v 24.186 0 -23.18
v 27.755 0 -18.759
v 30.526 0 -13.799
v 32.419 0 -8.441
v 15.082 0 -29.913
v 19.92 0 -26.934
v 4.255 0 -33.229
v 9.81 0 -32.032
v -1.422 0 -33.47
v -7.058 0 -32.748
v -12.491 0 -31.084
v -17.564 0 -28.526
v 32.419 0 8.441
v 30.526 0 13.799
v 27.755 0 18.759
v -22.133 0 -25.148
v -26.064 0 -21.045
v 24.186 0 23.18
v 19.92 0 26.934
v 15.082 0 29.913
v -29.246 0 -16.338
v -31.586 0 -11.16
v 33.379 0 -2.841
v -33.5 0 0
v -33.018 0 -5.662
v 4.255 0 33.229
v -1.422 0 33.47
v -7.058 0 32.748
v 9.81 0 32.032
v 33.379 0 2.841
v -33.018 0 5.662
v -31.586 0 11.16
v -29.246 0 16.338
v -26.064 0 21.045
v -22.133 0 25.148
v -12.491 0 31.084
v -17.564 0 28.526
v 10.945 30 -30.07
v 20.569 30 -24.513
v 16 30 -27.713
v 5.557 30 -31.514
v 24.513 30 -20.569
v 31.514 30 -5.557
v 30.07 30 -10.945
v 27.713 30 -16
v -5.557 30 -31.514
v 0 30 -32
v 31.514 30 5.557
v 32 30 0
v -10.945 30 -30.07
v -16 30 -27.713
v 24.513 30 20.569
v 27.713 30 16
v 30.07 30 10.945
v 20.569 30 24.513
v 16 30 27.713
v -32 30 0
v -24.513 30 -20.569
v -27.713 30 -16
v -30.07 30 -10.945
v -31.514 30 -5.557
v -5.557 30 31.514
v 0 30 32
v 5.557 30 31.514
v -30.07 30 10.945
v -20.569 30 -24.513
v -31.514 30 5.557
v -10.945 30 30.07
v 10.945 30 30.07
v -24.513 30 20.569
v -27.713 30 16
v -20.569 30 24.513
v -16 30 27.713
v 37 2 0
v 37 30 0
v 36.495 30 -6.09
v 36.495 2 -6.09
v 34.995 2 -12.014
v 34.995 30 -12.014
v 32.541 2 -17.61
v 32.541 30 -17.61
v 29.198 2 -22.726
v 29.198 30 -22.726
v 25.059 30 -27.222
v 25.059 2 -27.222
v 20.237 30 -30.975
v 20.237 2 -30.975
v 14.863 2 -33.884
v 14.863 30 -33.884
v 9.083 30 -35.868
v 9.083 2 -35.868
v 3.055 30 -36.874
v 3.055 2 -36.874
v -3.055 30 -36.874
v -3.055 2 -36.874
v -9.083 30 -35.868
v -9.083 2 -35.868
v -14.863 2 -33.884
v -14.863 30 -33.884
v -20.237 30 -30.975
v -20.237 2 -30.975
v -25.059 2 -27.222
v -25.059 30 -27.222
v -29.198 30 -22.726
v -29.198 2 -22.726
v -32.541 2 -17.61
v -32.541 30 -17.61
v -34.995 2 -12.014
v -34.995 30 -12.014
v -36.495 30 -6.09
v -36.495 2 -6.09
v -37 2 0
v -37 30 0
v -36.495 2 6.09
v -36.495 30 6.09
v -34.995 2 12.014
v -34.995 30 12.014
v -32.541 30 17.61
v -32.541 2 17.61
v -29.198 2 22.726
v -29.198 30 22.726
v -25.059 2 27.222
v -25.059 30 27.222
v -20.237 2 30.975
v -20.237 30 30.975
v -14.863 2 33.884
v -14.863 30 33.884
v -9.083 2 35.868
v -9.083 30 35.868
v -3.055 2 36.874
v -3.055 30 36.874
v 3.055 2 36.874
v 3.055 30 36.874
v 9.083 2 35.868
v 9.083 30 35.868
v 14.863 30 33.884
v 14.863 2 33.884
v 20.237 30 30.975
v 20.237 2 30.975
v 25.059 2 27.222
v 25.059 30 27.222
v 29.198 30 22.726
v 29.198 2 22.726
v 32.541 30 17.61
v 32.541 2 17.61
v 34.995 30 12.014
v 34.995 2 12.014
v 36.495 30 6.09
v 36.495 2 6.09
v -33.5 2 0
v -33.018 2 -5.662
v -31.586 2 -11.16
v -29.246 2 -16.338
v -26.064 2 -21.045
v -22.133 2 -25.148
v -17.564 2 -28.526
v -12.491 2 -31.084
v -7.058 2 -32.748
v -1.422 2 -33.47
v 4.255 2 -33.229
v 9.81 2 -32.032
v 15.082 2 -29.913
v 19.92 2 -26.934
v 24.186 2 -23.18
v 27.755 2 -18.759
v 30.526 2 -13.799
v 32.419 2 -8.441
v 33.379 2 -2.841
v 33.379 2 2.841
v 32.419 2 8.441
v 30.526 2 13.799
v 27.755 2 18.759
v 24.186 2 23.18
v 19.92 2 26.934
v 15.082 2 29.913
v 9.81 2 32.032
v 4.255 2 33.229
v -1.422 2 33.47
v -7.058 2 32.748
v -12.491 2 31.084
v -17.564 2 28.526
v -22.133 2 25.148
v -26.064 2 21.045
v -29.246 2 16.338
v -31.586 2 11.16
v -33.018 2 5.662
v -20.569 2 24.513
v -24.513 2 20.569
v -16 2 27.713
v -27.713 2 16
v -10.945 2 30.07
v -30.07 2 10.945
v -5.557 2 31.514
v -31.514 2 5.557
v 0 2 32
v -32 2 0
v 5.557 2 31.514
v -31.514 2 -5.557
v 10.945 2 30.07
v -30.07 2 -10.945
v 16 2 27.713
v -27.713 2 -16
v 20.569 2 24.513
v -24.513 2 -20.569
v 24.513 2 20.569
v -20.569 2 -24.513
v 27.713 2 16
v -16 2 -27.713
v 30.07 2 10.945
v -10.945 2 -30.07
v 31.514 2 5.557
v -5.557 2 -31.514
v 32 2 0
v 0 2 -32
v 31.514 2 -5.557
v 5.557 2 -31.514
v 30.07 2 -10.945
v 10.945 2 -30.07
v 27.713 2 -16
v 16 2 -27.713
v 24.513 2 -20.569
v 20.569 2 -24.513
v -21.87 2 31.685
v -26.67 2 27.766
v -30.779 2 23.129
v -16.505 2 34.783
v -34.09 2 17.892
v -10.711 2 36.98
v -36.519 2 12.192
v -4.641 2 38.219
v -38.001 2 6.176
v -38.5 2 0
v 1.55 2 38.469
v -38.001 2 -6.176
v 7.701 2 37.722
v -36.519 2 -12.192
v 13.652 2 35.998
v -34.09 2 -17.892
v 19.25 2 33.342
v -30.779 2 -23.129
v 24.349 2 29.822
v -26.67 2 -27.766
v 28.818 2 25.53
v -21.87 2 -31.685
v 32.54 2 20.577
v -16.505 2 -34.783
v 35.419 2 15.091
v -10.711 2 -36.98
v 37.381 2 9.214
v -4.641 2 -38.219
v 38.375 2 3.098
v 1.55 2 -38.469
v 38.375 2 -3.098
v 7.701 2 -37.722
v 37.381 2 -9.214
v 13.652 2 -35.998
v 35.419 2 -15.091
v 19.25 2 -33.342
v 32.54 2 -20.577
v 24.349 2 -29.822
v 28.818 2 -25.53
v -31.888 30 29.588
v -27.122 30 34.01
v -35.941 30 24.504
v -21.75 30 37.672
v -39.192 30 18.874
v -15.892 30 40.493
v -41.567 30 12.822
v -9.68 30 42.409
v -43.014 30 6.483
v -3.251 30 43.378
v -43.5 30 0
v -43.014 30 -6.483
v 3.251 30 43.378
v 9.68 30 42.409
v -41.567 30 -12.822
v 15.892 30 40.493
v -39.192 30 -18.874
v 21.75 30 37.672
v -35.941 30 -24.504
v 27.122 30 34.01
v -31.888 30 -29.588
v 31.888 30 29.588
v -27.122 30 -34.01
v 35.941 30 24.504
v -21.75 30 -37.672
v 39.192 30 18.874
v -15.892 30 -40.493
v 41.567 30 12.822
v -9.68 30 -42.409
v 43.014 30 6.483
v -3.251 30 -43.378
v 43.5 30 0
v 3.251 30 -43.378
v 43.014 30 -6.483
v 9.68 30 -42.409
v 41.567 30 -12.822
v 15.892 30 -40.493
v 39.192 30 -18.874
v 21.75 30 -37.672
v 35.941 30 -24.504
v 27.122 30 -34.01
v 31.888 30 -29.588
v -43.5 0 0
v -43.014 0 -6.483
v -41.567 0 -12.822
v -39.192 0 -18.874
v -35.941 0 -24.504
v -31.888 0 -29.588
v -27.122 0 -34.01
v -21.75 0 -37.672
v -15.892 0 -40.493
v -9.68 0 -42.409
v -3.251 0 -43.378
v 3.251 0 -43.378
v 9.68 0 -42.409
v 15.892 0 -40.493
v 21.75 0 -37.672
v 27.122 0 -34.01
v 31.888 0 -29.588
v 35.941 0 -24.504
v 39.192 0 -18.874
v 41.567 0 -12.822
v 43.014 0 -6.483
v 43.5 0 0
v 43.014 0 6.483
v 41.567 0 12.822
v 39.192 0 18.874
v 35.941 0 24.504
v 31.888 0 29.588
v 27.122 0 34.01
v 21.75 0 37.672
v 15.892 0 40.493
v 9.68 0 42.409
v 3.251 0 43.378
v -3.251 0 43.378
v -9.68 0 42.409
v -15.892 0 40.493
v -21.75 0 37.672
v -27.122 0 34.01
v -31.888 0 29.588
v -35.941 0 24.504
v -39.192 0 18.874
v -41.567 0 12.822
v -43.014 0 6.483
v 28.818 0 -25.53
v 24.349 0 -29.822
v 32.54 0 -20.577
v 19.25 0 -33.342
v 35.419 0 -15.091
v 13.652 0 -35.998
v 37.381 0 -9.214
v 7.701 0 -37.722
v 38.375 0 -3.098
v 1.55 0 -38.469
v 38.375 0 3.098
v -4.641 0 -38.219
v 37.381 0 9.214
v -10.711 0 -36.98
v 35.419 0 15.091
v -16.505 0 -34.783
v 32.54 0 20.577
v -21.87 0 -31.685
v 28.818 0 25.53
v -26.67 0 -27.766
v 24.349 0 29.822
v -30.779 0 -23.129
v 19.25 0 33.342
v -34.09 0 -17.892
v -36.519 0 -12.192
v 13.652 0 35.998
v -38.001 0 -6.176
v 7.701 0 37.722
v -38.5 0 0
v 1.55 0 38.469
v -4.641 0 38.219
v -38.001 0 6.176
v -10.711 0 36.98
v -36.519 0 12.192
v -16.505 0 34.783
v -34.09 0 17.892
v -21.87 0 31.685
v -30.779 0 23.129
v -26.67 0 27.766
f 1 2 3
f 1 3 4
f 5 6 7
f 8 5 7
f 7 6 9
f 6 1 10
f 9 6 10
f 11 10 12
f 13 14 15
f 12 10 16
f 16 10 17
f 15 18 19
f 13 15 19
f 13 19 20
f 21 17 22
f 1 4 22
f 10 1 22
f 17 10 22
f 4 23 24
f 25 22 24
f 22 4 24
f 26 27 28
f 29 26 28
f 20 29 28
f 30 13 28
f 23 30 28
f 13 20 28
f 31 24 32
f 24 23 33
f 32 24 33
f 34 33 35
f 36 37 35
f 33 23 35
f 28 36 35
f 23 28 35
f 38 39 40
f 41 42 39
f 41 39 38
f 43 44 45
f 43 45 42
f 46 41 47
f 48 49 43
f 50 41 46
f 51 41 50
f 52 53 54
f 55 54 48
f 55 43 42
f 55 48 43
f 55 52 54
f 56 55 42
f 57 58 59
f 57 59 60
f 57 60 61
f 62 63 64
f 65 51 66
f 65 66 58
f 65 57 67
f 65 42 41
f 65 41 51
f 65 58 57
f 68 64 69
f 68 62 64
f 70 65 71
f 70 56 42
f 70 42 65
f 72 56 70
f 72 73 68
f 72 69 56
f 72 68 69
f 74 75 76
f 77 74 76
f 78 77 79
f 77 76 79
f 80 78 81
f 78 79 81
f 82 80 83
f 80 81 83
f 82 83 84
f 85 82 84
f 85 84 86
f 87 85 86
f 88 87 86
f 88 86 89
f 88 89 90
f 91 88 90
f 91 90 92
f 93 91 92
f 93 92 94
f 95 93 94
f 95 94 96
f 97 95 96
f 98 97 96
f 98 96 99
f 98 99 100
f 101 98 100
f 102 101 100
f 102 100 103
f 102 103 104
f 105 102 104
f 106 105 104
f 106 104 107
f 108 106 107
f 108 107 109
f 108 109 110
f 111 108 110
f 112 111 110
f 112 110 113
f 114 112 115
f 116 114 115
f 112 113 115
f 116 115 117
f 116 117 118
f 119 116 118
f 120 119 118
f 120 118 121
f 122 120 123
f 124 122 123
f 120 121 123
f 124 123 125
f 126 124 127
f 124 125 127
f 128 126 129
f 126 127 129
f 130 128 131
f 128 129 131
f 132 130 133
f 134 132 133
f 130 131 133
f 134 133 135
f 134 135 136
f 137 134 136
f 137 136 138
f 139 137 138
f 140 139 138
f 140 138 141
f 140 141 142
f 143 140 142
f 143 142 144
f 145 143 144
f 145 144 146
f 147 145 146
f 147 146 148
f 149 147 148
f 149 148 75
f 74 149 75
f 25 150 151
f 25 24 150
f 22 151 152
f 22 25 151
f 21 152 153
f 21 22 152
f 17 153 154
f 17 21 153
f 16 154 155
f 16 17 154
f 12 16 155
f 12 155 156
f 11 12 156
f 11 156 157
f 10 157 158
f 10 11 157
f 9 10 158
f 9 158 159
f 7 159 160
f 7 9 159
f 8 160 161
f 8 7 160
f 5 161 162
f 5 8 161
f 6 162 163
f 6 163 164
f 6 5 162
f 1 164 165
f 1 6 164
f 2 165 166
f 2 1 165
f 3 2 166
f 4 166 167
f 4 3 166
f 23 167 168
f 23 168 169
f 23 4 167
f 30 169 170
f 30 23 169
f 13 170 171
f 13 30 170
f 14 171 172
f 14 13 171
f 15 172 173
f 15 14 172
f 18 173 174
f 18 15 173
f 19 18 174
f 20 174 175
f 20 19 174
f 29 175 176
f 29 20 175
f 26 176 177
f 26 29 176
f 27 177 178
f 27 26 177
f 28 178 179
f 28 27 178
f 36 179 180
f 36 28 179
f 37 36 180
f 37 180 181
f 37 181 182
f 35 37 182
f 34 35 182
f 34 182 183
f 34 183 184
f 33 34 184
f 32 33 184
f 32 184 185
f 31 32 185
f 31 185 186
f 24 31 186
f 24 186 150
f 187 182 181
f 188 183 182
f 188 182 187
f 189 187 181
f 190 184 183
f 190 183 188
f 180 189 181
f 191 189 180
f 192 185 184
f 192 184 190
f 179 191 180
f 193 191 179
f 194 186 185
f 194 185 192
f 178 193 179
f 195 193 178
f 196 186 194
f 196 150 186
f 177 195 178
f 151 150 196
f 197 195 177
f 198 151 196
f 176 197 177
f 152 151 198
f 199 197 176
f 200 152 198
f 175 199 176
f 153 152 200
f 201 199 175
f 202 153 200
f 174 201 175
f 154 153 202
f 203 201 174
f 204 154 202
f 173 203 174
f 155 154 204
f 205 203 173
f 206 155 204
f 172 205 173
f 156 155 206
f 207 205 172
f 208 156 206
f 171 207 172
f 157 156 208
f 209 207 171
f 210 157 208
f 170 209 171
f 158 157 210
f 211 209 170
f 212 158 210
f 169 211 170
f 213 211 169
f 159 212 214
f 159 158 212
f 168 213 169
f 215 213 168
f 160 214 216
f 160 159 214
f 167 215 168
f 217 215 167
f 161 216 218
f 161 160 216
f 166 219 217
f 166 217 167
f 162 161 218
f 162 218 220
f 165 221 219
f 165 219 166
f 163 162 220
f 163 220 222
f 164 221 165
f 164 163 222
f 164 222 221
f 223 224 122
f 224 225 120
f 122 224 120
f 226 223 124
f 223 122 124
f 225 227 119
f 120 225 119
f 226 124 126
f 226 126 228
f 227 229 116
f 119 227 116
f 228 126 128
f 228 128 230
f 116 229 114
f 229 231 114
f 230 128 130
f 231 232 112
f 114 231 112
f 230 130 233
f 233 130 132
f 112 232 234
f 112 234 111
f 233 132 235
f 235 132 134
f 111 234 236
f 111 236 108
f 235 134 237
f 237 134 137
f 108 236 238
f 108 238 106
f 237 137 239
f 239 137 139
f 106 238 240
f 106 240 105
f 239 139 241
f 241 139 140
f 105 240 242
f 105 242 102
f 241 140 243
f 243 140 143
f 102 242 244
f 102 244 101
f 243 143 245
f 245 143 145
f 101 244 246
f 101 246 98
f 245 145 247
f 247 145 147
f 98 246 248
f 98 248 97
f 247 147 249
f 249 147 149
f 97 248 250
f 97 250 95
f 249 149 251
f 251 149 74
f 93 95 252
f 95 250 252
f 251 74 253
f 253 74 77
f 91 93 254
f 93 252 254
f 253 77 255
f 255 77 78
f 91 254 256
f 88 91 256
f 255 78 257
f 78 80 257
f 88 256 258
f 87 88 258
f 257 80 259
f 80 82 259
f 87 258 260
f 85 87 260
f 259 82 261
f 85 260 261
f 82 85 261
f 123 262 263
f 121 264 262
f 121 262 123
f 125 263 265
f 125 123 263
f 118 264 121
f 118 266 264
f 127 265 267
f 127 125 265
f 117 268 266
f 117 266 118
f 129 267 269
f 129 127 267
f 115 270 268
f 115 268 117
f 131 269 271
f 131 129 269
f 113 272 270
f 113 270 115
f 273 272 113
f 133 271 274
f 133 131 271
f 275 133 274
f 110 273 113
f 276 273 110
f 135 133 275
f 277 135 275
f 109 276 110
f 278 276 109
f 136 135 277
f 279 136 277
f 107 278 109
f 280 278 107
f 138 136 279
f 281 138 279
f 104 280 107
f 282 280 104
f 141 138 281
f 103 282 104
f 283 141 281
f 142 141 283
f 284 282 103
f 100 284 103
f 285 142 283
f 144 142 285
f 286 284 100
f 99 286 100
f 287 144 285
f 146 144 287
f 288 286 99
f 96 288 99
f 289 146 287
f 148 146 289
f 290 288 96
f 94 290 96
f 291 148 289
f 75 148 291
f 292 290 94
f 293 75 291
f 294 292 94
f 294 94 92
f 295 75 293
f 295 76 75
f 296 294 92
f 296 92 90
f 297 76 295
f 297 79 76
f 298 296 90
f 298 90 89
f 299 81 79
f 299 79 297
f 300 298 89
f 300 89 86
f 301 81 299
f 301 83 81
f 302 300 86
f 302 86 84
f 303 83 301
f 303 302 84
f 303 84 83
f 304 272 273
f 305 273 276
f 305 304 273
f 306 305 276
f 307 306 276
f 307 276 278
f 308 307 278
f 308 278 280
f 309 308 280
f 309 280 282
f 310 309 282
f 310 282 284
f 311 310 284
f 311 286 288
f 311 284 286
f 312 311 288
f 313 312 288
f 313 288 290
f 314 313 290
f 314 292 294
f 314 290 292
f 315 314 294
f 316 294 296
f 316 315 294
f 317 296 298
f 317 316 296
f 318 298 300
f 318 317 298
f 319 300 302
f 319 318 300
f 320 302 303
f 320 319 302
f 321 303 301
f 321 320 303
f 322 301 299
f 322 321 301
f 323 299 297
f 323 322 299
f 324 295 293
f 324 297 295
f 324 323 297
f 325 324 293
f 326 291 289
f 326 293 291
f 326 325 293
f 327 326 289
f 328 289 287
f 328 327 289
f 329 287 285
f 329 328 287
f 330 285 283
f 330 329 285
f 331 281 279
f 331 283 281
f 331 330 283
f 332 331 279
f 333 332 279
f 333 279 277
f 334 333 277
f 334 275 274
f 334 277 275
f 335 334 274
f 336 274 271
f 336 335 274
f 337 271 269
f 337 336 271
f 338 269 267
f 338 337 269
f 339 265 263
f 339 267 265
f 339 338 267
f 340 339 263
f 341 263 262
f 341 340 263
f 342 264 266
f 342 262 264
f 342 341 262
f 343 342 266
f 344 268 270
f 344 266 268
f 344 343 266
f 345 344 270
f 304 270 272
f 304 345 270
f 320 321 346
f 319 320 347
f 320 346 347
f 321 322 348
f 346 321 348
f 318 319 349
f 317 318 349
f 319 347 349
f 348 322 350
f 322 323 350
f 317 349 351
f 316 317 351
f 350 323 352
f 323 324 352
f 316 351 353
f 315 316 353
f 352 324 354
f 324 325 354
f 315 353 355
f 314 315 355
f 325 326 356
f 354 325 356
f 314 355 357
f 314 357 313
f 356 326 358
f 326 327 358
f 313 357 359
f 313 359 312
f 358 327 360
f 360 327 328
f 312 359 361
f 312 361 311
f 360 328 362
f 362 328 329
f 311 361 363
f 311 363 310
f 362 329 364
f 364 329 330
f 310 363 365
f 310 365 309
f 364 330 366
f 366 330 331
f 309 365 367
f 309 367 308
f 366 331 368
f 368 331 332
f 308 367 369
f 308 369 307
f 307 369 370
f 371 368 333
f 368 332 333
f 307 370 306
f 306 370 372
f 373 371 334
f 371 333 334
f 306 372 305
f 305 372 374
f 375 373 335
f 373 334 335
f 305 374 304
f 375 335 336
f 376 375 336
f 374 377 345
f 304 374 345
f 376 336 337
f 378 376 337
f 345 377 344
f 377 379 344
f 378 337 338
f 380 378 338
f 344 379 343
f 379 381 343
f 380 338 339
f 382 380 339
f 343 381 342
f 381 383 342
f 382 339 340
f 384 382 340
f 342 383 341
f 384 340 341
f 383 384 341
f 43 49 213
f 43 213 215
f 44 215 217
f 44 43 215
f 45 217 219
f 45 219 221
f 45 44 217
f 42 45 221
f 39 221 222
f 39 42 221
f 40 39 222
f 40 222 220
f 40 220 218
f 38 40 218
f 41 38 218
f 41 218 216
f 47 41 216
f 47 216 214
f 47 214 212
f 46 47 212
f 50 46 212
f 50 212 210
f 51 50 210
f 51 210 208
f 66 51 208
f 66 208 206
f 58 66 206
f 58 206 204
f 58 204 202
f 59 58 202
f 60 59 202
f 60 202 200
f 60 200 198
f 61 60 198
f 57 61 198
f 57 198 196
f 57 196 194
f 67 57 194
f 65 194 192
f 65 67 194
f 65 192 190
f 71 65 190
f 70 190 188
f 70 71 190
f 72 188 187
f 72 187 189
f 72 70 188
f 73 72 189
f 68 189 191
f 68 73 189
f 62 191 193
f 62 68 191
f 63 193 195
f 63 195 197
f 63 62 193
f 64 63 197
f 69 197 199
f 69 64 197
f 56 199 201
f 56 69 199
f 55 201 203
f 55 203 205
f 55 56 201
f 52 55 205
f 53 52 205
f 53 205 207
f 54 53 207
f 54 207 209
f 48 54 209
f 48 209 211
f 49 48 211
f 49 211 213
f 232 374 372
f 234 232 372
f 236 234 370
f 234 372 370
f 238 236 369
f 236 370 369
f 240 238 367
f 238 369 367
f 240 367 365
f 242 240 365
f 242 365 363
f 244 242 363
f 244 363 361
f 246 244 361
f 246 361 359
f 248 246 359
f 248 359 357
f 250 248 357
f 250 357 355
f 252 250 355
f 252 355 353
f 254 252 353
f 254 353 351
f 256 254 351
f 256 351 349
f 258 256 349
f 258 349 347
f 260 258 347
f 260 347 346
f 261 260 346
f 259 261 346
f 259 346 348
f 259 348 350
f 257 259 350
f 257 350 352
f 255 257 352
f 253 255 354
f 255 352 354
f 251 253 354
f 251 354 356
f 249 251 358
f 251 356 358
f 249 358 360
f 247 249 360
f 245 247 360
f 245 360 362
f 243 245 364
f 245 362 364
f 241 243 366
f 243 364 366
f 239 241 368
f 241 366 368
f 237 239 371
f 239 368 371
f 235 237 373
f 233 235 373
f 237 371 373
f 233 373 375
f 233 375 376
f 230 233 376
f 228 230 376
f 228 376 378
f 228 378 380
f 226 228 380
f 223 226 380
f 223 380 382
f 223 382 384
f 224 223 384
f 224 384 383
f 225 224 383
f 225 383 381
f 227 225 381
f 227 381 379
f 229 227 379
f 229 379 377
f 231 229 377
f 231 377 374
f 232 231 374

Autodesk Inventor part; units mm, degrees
ref_plane "YZ Plane" through (0, 0, 0) normal (1, 0, 0) x (0, 1, 0)
ref_plane "XZ Plane" through (0, 0, 0) normal (0, 1, 0) x (-1, 0, 0)
ref_plane "XY Plane" through (0, 0, 0) normal (0, 0, 1) x (1, 0, 0)
sketch "스케치1" plane through (0, 0, 0) normal (0, 1, 0) x (-1, 0, 0)
  circle A0 centre (0, 0) radius 43.5
  circle A1 centre (0, 0) radius 38.5
  circle A2 centre (0, 0) radius 33.5
  dimension "d0" = 87
  dimension "d1" = 77
  dimension "d2" = 67
extrude "돌출1" add sketch "스케치1" along normal blind 30
sketch "스케치2" plane through (0, 30, 0) normal (0, 1, 0) x (1, 0, 0)
  circle A0 centre (0, 0) radius 33.5 projected
  circle A1 centre (0, 0) radius 32
  dimension "d5" = 64
extrude "돌출2" cut sketch "스케치2" against normal blind 28
sketch "스케치3" plane through (0, 30, 0) normal (0, 1, 0) x (1, 0, 0)
  circle A0 centre (0, 0) radius 38.5 projected
  circle A1 centre (0, 0) radius 43.5 projected
  circle A2 centre (0, 0) radius 37
  dimension "d8" = 74
extrude "돌출3" add sketch "스케치3" against normal blind 28 contours A0
properties part number "실리콘틀_위" material "나일론, 이황화 몰리브덴"
